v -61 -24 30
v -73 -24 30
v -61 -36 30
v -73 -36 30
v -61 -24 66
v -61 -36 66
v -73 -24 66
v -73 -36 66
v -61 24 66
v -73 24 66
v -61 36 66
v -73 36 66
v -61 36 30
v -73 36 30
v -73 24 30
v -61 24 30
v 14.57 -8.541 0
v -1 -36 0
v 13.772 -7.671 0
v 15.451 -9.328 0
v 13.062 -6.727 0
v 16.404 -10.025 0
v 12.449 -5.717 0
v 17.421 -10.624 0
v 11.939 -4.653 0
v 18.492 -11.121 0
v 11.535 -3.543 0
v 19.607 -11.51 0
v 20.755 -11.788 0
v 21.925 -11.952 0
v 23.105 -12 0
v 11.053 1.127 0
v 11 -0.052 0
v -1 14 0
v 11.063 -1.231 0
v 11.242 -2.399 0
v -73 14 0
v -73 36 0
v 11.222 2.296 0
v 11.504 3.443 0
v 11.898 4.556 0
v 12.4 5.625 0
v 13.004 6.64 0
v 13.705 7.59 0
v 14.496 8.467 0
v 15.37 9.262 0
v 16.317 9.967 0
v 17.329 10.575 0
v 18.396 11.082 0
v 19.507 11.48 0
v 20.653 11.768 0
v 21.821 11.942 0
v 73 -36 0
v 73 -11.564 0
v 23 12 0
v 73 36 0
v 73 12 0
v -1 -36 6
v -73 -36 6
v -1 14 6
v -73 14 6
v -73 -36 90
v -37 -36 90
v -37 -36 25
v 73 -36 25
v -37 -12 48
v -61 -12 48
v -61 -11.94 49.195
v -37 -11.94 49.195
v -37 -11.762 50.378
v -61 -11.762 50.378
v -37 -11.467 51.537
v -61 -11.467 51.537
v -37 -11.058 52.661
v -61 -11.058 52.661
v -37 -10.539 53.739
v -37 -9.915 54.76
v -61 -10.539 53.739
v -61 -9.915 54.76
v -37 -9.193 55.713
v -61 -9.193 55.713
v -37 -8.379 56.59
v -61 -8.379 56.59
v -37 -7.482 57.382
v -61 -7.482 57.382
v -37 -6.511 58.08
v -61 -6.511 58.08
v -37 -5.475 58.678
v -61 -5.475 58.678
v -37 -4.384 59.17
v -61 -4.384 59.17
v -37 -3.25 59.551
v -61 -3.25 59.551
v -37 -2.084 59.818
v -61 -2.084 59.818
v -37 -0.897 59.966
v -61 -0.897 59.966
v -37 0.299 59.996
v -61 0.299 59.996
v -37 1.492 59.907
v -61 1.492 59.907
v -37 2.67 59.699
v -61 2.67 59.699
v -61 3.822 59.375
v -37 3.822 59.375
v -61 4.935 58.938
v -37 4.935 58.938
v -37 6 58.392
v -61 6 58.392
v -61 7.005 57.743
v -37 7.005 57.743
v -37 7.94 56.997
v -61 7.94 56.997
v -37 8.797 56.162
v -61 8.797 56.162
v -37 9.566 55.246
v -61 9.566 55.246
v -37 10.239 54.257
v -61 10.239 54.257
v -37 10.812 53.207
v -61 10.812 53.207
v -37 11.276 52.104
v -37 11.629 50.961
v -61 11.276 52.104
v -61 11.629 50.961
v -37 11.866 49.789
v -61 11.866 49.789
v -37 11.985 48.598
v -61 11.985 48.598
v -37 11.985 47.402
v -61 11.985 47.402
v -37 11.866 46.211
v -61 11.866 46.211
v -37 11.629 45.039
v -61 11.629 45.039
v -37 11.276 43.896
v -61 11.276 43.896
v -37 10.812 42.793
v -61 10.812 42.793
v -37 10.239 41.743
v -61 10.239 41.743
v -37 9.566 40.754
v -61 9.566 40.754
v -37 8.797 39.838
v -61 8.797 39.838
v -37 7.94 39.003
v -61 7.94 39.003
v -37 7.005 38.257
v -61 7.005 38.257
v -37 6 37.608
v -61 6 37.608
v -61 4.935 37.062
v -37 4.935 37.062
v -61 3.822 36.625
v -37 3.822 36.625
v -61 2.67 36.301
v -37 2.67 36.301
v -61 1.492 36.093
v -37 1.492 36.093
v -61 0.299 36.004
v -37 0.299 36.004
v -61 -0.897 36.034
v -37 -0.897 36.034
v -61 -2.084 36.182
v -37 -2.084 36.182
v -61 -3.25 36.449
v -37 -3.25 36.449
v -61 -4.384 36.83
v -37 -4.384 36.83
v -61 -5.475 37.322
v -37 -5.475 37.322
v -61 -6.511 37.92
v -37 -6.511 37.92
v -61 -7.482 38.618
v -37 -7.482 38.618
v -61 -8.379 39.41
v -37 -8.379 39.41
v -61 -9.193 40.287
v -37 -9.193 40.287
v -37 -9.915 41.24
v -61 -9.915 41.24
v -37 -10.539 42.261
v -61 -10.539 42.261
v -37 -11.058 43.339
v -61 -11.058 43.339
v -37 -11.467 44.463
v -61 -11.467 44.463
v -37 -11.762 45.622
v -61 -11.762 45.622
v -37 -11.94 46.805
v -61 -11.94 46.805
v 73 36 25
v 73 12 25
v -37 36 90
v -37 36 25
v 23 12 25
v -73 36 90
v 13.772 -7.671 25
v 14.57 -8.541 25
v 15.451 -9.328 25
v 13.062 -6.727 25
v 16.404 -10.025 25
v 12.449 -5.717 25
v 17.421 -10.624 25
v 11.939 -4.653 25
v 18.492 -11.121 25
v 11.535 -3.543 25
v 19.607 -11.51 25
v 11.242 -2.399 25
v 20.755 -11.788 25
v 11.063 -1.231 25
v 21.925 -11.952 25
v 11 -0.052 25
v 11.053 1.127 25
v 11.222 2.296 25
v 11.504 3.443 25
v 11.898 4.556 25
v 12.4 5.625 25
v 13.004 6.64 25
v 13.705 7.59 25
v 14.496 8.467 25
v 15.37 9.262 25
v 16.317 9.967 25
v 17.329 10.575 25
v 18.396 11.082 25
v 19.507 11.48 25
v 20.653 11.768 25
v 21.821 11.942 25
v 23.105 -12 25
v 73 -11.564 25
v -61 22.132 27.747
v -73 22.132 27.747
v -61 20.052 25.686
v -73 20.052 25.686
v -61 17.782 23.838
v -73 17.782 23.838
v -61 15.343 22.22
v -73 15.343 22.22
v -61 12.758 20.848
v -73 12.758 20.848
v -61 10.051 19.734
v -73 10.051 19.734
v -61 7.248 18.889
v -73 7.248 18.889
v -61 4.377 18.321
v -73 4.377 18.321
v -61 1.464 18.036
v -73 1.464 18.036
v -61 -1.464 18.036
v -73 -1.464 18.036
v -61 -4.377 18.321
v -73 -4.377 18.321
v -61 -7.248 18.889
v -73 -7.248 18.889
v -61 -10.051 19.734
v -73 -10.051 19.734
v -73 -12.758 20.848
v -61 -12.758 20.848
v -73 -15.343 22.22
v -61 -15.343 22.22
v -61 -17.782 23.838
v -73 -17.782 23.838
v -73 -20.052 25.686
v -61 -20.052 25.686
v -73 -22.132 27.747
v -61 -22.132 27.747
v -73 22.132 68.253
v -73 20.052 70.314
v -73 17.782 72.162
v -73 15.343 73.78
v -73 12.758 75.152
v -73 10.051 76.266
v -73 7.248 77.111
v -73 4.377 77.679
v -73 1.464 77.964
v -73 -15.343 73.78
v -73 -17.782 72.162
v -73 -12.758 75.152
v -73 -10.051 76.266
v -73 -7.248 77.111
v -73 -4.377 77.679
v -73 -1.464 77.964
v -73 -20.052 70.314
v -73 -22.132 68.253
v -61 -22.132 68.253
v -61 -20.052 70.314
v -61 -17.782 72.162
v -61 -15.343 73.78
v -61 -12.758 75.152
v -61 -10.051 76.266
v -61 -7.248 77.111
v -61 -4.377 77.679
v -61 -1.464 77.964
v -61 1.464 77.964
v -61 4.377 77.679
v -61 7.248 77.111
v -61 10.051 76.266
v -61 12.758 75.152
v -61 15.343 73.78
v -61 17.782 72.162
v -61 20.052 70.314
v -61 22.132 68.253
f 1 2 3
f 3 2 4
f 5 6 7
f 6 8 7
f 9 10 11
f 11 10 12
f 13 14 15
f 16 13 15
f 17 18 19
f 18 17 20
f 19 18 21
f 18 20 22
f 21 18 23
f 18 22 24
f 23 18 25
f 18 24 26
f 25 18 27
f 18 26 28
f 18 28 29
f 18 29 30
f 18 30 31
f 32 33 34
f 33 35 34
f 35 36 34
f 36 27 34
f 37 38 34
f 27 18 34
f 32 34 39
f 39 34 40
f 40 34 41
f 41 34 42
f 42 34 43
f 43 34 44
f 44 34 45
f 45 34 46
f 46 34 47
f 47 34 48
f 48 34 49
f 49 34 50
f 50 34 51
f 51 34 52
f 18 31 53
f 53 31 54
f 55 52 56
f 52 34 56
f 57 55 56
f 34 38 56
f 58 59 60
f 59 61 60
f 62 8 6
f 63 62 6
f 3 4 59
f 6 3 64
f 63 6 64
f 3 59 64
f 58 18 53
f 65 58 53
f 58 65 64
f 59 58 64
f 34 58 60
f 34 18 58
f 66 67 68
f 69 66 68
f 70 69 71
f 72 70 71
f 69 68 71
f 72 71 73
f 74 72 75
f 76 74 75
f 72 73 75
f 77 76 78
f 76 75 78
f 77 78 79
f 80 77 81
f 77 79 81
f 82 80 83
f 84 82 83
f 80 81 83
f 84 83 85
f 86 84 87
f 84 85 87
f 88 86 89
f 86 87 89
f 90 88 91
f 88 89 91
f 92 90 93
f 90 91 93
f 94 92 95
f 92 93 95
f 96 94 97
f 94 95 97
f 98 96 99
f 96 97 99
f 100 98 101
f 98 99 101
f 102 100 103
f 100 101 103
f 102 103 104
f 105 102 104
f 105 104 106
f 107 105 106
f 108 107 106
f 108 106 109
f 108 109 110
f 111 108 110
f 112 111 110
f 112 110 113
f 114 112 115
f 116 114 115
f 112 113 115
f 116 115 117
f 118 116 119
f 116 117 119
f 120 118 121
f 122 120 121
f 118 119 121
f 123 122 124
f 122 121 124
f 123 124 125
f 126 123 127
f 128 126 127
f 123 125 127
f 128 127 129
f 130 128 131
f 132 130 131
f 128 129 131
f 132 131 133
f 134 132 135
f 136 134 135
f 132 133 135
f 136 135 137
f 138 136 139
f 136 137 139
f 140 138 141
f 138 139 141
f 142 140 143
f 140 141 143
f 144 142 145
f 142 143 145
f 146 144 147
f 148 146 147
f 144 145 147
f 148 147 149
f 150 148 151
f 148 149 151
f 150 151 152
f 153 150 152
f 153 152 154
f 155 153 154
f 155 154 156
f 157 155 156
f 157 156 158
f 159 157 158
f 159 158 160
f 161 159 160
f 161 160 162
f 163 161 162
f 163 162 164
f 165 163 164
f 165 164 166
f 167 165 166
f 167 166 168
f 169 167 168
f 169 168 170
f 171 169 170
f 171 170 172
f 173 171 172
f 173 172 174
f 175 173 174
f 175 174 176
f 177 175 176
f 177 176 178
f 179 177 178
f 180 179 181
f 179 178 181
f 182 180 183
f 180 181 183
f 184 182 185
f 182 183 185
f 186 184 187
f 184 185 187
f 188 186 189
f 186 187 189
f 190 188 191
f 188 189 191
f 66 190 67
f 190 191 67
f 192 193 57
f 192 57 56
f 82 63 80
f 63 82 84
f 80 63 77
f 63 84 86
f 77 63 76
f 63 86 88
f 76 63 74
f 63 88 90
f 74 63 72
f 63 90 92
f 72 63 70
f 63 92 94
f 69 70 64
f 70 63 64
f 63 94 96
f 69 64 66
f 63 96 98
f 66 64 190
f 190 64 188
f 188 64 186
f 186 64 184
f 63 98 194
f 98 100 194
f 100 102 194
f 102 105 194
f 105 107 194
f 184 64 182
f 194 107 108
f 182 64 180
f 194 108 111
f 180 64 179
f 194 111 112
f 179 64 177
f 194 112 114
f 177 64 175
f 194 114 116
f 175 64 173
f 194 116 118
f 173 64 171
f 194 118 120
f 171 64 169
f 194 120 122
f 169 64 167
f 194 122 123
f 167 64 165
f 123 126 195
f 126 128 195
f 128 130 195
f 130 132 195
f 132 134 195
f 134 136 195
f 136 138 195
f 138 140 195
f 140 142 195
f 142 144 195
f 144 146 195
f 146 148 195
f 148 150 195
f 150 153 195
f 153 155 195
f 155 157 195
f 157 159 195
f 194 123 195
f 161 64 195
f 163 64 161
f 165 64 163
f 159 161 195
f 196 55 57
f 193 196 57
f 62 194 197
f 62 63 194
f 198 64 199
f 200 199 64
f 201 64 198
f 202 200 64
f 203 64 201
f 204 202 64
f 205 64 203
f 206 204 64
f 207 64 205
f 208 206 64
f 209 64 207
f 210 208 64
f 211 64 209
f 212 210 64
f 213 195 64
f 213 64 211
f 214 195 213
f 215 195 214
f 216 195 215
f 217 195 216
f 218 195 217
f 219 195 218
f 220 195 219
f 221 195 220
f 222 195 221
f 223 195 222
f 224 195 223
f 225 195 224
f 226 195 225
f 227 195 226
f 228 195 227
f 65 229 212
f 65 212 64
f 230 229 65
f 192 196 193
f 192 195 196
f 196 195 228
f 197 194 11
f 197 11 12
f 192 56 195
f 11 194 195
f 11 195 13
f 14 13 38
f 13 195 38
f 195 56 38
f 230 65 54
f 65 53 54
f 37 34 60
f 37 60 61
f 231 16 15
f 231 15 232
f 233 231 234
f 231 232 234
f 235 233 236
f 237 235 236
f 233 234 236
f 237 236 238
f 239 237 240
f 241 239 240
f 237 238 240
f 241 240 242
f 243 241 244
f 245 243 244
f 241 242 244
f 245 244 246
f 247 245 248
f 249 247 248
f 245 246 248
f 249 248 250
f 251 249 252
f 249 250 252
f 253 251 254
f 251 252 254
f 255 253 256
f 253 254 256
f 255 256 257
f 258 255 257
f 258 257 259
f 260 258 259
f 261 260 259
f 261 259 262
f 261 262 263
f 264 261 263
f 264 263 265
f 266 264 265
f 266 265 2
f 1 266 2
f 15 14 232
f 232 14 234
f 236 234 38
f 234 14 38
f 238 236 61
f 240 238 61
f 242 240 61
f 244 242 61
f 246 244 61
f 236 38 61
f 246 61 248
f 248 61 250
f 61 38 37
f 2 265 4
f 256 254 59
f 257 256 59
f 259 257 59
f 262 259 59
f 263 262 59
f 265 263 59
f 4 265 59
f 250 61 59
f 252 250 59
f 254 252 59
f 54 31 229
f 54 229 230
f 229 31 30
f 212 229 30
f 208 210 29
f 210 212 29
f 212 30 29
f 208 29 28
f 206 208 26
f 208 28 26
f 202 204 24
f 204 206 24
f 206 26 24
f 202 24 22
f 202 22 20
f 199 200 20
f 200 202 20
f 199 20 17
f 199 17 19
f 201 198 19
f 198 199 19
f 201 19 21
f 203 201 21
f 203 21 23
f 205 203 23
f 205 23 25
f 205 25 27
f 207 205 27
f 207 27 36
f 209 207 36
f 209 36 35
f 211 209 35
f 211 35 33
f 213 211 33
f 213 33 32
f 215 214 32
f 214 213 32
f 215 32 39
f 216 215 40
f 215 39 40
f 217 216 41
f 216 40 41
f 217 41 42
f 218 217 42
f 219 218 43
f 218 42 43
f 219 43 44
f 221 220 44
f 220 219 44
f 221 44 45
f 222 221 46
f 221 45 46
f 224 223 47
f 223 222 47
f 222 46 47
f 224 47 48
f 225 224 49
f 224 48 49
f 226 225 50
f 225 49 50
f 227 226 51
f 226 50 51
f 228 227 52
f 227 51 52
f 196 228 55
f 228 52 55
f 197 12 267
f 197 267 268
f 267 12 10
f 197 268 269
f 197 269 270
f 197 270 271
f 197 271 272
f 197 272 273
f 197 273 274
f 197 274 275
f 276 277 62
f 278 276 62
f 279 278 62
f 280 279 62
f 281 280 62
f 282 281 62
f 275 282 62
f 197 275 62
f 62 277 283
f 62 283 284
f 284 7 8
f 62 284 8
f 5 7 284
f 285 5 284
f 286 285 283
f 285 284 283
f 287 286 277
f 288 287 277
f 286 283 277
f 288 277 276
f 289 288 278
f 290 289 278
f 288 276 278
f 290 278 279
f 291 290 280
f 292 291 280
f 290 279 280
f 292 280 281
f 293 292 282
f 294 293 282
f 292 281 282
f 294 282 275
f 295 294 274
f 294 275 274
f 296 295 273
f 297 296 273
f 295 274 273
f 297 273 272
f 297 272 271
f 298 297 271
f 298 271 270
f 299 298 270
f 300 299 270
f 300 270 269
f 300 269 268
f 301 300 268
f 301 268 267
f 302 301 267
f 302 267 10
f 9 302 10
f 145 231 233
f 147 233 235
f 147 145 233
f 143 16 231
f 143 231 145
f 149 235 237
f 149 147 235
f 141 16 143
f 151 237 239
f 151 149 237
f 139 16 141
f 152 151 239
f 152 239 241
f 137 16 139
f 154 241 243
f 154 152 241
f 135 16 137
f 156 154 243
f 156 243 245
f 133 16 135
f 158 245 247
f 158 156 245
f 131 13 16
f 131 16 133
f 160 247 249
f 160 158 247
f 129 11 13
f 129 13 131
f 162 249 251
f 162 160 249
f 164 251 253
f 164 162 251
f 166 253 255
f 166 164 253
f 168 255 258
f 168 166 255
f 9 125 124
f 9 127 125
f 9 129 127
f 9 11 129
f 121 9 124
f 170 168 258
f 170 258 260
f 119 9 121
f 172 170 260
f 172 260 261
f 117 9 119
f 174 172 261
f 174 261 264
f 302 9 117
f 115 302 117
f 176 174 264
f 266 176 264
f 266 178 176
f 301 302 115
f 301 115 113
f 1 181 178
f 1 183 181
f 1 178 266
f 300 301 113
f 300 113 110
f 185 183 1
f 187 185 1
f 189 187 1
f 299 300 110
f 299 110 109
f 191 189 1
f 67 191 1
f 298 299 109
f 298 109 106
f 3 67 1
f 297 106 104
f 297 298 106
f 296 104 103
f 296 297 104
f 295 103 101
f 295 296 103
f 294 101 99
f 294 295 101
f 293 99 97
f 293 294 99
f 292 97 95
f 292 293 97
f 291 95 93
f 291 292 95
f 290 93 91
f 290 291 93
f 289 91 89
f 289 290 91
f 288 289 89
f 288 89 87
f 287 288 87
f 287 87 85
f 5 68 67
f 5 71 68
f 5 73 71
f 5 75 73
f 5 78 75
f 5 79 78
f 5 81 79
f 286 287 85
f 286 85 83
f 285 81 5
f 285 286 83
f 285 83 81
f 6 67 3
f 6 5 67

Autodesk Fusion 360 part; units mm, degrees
sketch "Sketch1" plane through (0, 0, 0) normal (0, 0, 1) x (1, 0, 0)
  line L0 (-73, -36) -> (73, -36)
  line L1 (73, -36) -> (73, 36)
  line L2 (73, 36) -> (-73, 36)
  line L3 (-73, 36) -> (-73, -36)
  line L4 (-73, -36) -> (73, 36) construction
  line L5 (73, -36) -> (-73, 36) construction
  line L6 (-73, -36) -> (-1, -36)
  line L7 (-1, -36) -> (-1, 14)
  line L8 (-1, 14) -> (-73, 14)
  line L9 (-73, 14) -> (-73, -36)
  line L10 (23.1046, -11.9995) -> (73, -11.5645)
  line L11 (23, 12) -> (73, 12)
  arc A0 (24.2094, 11.9389) -> (24.2094, -11.9389) centre (23, 0) ccw
  dimension "d1" = 146
  dimension "d2" = 72
  dimension "d3" = 72
  dimension "d4" = 50
  dimension "d5" = 24
extrude "Extrude1" add sketch "Sketch1" along normal blind 25 contours L0 L3 L6 L7 L8 L9 | L0 L1 L2 L3 L7 L8 L10 L11 A0
extrude "Extrude2" cut sketch "Sketch1" along normal blind 6 contours L0 L3 L6 L7 L8 L9
sketch "Sketch2" plane through (0, 0, 25) normal (0, 0, 1) x (-1, 0, 0)
  arc A0 (-23, -12) -> (-23.1046, 11.9995) centre (-23, 0) ccw
  line L0 (-23, -12) -> (-73, -12)
  line L1 (-73, -12) -> (-73, -36)
  line L2 (-73, -36) -> (73, -36)
  line L3 (73, -36) -> (73, 36)
  line L4 (73, 36) -> (-73, 36)
  line L5 (-73, 36) -> (-73, 11.5645)
  line L6 (-73, 11.5645) -> (-23.1046, 11.9995)
  line L7 (73, 36) -> (37, 36)
  line L8 (37, 36) -> (37, -36)
  line L9 (37, -36) -> (73, -36)
  line L10 (73, -36) -> (73, 36)
  dimension "d11" = 36
extrude "Extrude3" add sketch "Sketch2" along normal blind 65 contours L2 L3 L4 L7 L8 L9 L10
sketch "Sketch3" plane through (-73, 0, 0) normal (-1, 0, 0) x (0, -1, 0)
  line L0 (-14, 0) -> (-14, 6)
  line L1 (-14, 6) -> (36, 6)
  line L2 (36, 6) -> (36, 90)
  line L3 (36, 90) -> (-36, 90)
  line L4 (-36, 90) -> (-36, 0)
  line L5 (-36, 0) -> (-14, 0)
  circle A0 centre (0, 48) radius 12
  circle A1 centre (0, 48) radius 30
  line L6 (-36, 90) -> (36, 90)
  line L7 (36, 90) -> (36, 66)
  line L8 (36, 66) -> (-36, 66)
  line L9 (-36, 66) -> (-36, 90)
  line L10 (36, 6) -> (-36, 6)
  line L11 (-36, 6) -> (-36, 30)
  line L12 (-36, 30) -> (36, 30)
  line L13 (36, 30) -> (36, 6)
  dimension "d14" = 24
  dimension "d15" = 60
  dimension "d16" = 48
  dimension "d17" = 24
  dimension "d18" = 24
extrude "Extrude4" cut sketch "Sketch3" against normal through all contours A0
extrude "Extrude5" cut sketch "Sketch3" against normal blind 12 contours L2 A1 L8 L12 | L4 A1 L8 L12 | A1 L8 L12 | A1 L12 | A1 L8
